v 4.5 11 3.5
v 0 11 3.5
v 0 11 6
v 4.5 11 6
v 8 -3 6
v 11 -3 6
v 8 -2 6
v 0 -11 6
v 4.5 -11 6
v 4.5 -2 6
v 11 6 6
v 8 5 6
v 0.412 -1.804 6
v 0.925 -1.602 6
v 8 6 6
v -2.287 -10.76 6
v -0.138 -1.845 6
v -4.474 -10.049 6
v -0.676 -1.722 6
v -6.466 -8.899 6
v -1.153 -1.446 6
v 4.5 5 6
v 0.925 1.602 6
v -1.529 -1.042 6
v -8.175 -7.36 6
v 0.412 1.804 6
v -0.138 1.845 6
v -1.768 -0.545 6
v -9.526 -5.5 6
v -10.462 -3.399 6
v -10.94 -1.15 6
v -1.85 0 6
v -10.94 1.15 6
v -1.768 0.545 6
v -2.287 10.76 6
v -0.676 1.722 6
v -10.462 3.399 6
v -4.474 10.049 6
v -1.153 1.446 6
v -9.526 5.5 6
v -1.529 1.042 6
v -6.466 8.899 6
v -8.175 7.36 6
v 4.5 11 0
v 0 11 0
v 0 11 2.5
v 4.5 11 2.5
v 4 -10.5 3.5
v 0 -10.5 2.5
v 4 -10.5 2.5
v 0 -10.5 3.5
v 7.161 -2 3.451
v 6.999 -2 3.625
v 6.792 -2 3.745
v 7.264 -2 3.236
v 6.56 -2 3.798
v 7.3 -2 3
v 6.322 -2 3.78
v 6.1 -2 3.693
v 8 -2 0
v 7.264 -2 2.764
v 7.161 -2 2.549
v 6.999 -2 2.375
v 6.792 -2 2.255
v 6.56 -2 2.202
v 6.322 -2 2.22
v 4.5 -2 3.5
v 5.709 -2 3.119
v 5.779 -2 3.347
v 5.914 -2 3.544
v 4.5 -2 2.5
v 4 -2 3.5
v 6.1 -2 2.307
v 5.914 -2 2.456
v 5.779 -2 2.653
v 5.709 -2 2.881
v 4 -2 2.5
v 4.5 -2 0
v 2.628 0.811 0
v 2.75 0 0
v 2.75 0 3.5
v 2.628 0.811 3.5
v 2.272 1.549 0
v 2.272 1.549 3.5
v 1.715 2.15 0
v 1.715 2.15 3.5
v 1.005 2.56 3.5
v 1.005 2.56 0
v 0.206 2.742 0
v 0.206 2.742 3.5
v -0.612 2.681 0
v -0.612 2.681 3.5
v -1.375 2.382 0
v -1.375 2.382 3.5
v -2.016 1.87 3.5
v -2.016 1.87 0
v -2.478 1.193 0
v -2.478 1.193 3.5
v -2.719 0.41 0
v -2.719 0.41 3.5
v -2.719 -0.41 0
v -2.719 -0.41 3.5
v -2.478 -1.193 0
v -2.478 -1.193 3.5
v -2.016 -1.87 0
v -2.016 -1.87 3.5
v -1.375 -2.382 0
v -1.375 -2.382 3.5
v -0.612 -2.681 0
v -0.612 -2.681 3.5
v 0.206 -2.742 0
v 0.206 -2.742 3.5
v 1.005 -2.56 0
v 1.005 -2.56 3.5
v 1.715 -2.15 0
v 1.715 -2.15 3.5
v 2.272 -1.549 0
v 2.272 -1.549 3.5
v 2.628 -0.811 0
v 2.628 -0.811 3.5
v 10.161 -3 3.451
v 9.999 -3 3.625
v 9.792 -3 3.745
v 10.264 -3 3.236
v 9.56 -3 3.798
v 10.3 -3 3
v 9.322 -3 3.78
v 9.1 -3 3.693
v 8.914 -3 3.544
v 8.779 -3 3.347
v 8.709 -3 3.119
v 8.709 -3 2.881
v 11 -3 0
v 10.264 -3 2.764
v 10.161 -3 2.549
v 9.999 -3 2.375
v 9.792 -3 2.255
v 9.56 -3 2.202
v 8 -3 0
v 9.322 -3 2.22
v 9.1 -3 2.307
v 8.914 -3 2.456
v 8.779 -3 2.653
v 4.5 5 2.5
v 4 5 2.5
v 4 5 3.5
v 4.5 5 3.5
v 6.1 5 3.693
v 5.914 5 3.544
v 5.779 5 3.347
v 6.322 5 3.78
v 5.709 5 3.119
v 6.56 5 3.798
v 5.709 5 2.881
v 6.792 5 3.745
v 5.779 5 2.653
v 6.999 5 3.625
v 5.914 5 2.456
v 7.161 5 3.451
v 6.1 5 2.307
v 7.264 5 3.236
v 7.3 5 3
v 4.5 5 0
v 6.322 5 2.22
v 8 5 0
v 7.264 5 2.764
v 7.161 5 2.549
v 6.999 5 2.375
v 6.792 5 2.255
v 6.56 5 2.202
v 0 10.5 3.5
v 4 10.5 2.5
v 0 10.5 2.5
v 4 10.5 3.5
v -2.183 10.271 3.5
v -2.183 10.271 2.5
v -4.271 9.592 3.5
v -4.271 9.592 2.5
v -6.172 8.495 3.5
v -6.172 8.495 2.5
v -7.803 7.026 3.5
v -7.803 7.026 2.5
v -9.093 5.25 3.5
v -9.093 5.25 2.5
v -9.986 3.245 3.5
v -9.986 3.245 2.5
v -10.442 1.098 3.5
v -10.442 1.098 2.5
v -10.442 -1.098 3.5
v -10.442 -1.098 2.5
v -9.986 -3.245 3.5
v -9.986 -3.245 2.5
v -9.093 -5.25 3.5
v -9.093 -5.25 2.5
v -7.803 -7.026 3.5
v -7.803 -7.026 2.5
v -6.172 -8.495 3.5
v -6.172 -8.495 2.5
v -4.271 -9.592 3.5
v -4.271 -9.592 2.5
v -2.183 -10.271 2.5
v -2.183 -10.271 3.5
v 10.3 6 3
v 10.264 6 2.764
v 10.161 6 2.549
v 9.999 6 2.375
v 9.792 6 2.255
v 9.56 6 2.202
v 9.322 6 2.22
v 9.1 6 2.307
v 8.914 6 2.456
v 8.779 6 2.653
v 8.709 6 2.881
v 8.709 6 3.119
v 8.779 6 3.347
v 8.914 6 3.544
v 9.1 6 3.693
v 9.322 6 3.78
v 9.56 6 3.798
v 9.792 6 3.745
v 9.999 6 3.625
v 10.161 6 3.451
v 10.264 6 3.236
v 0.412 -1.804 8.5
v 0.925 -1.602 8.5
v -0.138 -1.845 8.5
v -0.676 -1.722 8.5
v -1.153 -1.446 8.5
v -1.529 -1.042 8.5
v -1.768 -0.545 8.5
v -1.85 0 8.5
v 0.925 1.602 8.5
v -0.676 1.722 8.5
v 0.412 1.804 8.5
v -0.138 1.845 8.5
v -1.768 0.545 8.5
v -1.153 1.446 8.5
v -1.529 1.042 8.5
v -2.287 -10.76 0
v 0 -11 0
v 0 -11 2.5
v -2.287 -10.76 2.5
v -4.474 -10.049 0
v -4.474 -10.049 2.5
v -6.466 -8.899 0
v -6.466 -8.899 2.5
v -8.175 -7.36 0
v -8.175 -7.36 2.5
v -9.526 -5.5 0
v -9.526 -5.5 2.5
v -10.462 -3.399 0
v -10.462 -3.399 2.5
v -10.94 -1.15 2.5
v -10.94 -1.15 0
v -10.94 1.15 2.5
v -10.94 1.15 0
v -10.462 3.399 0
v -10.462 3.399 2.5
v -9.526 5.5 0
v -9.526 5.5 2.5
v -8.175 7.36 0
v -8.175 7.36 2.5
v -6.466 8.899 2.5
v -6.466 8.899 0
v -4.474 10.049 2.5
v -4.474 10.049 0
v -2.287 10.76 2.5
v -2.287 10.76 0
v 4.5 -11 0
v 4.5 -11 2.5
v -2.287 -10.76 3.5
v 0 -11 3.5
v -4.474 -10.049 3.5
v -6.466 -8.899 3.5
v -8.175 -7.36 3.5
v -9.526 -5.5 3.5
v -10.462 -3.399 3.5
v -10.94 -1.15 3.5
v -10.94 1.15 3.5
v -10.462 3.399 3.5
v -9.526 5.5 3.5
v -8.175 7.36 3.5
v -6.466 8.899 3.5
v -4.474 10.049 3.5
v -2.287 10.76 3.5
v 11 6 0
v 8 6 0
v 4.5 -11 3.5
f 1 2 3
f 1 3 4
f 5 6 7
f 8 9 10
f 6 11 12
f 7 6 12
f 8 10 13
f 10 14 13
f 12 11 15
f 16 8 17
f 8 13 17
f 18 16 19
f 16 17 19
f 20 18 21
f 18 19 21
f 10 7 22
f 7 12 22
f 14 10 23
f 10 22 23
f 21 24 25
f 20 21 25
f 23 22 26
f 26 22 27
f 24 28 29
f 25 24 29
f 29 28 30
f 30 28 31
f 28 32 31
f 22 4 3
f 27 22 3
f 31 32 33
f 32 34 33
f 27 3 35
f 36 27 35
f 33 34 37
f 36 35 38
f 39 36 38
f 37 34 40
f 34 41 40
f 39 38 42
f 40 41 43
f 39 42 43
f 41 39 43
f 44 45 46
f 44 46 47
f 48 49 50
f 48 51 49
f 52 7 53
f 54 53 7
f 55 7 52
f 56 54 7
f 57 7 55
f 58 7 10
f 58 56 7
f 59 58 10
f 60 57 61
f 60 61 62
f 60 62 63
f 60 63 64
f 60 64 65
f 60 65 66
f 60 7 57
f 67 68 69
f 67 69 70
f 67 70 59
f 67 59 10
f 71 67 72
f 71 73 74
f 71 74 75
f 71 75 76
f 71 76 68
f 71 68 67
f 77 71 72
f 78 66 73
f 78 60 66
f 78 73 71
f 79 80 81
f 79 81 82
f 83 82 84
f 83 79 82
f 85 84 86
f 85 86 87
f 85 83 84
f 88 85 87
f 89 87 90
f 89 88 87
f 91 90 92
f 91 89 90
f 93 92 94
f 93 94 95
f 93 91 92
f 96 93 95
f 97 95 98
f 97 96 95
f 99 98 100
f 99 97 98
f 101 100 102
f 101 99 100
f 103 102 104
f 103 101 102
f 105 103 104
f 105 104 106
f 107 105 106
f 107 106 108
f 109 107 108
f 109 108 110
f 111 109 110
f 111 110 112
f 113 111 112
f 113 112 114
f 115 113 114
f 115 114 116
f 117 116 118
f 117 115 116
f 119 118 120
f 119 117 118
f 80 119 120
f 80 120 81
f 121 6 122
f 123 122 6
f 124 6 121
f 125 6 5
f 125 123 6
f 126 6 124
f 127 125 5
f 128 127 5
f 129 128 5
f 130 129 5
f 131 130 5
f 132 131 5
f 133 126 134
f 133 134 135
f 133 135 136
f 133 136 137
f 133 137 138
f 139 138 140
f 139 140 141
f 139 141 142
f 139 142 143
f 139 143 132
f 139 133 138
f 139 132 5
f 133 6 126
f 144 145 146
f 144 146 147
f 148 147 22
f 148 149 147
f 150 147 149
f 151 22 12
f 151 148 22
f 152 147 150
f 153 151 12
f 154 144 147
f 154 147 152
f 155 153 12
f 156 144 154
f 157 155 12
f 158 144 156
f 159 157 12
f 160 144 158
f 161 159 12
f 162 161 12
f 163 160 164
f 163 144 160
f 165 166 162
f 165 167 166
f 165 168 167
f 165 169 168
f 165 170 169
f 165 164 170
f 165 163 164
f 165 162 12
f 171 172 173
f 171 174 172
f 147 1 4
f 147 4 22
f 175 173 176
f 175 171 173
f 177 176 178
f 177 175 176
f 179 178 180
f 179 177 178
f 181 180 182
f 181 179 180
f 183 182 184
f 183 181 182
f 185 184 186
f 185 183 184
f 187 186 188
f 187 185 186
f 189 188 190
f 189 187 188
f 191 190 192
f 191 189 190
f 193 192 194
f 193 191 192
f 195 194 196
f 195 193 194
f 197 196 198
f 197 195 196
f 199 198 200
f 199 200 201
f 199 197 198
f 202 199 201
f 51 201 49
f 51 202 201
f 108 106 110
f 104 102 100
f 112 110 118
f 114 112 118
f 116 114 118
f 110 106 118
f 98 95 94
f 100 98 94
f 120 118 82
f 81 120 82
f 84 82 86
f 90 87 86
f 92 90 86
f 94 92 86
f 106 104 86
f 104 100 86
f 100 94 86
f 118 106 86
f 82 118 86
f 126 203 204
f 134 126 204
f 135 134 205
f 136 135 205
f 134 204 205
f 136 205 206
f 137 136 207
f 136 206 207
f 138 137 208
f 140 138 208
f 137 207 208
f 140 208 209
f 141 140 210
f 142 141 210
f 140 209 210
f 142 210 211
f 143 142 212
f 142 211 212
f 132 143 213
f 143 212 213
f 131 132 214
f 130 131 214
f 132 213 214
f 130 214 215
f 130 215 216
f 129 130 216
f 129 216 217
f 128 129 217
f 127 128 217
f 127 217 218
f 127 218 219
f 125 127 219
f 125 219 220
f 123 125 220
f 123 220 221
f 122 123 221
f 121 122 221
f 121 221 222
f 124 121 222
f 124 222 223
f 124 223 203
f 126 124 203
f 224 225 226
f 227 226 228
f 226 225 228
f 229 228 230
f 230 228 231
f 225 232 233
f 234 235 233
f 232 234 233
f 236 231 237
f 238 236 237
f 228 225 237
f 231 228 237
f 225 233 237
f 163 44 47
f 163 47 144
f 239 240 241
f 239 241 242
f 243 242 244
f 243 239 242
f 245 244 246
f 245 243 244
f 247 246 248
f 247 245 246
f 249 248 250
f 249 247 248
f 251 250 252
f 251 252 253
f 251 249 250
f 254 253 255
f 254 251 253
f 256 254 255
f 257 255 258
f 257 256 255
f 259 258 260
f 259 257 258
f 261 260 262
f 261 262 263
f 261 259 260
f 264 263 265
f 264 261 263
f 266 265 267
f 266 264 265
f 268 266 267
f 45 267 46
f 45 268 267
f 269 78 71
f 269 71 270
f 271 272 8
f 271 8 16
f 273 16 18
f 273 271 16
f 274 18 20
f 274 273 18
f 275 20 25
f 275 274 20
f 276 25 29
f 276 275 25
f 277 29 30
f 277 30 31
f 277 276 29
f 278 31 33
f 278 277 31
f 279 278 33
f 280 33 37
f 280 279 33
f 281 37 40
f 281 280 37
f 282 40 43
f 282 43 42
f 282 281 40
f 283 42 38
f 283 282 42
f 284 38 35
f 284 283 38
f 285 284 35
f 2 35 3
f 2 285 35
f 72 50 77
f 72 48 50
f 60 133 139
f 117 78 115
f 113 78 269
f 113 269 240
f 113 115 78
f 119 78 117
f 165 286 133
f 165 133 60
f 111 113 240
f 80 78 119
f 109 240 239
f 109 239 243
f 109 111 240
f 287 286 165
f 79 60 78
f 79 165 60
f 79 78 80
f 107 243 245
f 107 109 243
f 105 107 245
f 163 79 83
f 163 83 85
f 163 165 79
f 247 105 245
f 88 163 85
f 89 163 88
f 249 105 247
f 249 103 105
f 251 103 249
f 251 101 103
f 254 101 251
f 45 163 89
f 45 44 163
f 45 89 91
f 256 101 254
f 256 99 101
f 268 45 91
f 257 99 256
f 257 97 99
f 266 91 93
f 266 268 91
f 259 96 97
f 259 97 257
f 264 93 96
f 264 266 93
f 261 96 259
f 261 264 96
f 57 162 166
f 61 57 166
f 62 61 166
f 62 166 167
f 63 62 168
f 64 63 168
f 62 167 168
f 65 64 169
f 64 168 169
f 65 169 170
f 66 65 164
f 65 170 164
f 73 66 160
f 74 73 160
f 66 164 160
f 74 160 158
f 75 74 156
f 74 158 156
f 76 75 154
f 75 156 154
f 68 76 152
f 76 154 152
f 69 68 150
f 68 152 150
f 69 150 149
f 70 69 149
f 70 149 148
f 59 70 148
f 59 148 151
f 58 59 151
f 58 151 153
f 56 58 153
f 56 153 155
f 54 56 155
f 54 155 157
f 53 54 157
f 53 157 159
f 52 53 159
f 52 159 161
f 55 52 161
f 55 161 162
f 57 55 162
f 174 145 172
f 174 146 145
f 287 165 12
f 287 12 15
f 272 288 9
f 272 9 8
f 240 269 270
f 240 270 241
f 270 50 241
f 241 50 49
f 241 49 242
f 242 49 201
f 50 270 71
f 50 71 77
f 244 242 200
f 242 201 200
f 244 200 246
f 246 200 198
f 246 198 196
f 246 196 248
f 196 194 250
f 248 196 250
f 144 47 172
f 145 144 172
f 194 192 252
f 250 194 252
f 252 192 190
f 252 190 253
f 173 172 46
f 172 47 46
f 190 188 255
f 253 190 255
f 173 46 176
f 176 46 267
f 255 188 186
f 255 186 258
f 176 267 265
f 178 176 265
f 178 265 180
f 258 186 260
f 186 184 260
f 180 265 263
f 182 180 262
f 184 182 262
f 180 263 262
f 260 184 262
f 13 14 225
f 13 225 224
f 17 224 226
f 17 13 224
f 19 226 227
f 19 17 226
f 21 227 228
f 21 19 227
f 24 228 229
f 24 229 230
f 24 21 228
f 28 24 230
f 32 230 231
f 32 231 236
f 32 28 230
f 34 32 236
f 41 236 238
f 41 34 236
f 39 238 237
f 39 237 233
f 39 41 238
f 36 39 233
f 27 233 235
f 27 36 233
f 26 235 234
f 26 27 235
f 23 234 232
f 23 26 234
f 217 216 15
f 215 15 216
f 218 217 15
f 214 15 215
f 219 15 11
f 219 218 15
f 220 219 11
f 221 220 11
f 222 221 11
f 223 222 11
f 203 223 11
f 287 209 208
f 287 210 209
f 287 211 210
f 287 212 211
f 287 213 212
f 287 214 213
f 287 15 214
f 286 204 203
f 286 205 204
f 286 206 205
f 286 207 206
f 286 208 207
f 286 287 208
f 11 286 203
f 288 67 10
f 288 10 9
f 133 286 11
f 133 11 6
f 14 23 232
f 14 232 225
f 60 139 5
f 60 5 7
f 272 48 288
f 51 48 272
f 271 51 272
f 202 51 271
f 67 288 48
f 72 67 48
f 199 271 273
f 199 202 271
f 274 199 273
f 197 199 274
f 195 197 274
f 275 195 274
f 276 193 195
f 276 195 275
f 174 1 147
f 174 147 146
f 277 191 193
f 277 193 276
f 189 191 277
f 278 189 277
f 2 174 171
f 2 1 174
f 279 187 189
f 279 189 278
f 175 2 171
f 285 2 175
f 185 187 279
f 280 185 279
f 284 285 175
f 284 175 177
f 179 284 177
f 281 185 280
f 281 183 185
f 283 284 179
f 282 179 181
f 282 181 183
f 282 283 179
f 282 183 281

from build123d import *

# Parameters (mm, degrees)
BOSS_EXTRUDE1_DEPTH = 6
CUT_EXTRUDE1_START  = 10
SKETCH2_R           = 0.8
CUT_EXTRUDE1_DEPTH  = 22
CUT_EXTRUDE2_START  = 3
CUT_EXTRUDE2_DEPTH  = 0.5
BOSS_EXTRUDE2_START = 6
BOSS_EXTRUDE2_DEPTH = 2.5
SKETCH5_R           = 2.75
CUT_EXTRUDE3_DEPTH  = 3.5


with BuildPart() as part:
    # Sketch1 → Boss-Extrude1 (new body)
    with BuildSketch(Plane.XY):
        with BuildLine():
            Line((11, 6), (11, -3))
            Line((11, -3), (8, -3))
            Line((8, -3), (8, -2))
            Line((8, -2), (4.5, -2))
            Line((4.5, -2), (4.5, -11))
            Line((4.5, -11), (0, -11))
            ThreePointArc((0, -11), (-11, 0), (0, 11))
            Line((0, 11), (4.5, 11))
            Line((4.5, 11), (4.5, 5))
            Line((4.5, 5), (8, 5))
            Line((8, 5), (8, 6))
            Line((8, 6), (11, 6))
        make_face()
    extrude(amount=BOSS_EXTRUDE1_DEPTH)

    # Sketch2 → Cut-Extrude1 (cut, through all)
    with BuildSketch(Plane(origin=(0, 0, 0), x_dir=(1, 0, 0), z_dir=(0, 1, 0)).offset(CUT_EXTRUDE1_START)):
        with Locations((6.5, -3)):
            Circle(SKETCH2_R)
        with Locations((9.5, -3)):
            Circle(SKETCH2_R)
    extrude(amount=-CUT_EXTRUDE1_DEPTH, mode=Mode.SUBTRACT)

    # Sketch3 → Cut-Extrude2 (cut, symmetric)
    with BuildSketch(Plane.XY.offset(CUT_EXTRUDE2_START)):
        with BuildLine():
            Line((0, 11), (4.5, 11))
            Line((4.5, 11), (4.5, 5))
            Line((4.5, 5), (4, 5))
            Line((4, 5), (4, 10.5))
            Line((4, 10.5), (0, 10.5))
            ThreePointArc((0, 10.5), (-10.5, 0), (0, -10.5))
            Line((0, -10.5), (4, -10.5))
            Line((4, -10.5), (4, -2))
            Line((4, -2), (4.5, -2))
            Line((4.5, -2), (4.5, -11))
            Line((4.5, -11), (0, -11))
            ThreePointArc((0, -11), (-11, 0), (0, 11))
        make_face()
    extrude(amount=CUT_EXTRUDE2_DEPTH, both=True, mode=Mode.SUBTRACT)

    # Sketch4 → Boss-Extrude2 (add)
    with BuildSketch(Plane.XY.offset(BOSS_EXTRUDE2_START)):
        with BuildLine():
            Line((0.925, 1.602146997), (0.925, -1.602146997))
            ThreePointArc((0.925, -1.602146997), (-1.85, 0), (0.925, 1.602146997))
        make_face()
    extrude(amount=BOSS_EXTRUDE2_DEPTH)

    # Sketch5 → Cut-Extrude3 (cut)
    with BuildSketch(Plane.XY):
        Circle(SKETCH5_R)
    extrude(amount=CUT_EXTRUDE3_DEPTH, mode=Mode.SUBTRACT)


solid = part.part
